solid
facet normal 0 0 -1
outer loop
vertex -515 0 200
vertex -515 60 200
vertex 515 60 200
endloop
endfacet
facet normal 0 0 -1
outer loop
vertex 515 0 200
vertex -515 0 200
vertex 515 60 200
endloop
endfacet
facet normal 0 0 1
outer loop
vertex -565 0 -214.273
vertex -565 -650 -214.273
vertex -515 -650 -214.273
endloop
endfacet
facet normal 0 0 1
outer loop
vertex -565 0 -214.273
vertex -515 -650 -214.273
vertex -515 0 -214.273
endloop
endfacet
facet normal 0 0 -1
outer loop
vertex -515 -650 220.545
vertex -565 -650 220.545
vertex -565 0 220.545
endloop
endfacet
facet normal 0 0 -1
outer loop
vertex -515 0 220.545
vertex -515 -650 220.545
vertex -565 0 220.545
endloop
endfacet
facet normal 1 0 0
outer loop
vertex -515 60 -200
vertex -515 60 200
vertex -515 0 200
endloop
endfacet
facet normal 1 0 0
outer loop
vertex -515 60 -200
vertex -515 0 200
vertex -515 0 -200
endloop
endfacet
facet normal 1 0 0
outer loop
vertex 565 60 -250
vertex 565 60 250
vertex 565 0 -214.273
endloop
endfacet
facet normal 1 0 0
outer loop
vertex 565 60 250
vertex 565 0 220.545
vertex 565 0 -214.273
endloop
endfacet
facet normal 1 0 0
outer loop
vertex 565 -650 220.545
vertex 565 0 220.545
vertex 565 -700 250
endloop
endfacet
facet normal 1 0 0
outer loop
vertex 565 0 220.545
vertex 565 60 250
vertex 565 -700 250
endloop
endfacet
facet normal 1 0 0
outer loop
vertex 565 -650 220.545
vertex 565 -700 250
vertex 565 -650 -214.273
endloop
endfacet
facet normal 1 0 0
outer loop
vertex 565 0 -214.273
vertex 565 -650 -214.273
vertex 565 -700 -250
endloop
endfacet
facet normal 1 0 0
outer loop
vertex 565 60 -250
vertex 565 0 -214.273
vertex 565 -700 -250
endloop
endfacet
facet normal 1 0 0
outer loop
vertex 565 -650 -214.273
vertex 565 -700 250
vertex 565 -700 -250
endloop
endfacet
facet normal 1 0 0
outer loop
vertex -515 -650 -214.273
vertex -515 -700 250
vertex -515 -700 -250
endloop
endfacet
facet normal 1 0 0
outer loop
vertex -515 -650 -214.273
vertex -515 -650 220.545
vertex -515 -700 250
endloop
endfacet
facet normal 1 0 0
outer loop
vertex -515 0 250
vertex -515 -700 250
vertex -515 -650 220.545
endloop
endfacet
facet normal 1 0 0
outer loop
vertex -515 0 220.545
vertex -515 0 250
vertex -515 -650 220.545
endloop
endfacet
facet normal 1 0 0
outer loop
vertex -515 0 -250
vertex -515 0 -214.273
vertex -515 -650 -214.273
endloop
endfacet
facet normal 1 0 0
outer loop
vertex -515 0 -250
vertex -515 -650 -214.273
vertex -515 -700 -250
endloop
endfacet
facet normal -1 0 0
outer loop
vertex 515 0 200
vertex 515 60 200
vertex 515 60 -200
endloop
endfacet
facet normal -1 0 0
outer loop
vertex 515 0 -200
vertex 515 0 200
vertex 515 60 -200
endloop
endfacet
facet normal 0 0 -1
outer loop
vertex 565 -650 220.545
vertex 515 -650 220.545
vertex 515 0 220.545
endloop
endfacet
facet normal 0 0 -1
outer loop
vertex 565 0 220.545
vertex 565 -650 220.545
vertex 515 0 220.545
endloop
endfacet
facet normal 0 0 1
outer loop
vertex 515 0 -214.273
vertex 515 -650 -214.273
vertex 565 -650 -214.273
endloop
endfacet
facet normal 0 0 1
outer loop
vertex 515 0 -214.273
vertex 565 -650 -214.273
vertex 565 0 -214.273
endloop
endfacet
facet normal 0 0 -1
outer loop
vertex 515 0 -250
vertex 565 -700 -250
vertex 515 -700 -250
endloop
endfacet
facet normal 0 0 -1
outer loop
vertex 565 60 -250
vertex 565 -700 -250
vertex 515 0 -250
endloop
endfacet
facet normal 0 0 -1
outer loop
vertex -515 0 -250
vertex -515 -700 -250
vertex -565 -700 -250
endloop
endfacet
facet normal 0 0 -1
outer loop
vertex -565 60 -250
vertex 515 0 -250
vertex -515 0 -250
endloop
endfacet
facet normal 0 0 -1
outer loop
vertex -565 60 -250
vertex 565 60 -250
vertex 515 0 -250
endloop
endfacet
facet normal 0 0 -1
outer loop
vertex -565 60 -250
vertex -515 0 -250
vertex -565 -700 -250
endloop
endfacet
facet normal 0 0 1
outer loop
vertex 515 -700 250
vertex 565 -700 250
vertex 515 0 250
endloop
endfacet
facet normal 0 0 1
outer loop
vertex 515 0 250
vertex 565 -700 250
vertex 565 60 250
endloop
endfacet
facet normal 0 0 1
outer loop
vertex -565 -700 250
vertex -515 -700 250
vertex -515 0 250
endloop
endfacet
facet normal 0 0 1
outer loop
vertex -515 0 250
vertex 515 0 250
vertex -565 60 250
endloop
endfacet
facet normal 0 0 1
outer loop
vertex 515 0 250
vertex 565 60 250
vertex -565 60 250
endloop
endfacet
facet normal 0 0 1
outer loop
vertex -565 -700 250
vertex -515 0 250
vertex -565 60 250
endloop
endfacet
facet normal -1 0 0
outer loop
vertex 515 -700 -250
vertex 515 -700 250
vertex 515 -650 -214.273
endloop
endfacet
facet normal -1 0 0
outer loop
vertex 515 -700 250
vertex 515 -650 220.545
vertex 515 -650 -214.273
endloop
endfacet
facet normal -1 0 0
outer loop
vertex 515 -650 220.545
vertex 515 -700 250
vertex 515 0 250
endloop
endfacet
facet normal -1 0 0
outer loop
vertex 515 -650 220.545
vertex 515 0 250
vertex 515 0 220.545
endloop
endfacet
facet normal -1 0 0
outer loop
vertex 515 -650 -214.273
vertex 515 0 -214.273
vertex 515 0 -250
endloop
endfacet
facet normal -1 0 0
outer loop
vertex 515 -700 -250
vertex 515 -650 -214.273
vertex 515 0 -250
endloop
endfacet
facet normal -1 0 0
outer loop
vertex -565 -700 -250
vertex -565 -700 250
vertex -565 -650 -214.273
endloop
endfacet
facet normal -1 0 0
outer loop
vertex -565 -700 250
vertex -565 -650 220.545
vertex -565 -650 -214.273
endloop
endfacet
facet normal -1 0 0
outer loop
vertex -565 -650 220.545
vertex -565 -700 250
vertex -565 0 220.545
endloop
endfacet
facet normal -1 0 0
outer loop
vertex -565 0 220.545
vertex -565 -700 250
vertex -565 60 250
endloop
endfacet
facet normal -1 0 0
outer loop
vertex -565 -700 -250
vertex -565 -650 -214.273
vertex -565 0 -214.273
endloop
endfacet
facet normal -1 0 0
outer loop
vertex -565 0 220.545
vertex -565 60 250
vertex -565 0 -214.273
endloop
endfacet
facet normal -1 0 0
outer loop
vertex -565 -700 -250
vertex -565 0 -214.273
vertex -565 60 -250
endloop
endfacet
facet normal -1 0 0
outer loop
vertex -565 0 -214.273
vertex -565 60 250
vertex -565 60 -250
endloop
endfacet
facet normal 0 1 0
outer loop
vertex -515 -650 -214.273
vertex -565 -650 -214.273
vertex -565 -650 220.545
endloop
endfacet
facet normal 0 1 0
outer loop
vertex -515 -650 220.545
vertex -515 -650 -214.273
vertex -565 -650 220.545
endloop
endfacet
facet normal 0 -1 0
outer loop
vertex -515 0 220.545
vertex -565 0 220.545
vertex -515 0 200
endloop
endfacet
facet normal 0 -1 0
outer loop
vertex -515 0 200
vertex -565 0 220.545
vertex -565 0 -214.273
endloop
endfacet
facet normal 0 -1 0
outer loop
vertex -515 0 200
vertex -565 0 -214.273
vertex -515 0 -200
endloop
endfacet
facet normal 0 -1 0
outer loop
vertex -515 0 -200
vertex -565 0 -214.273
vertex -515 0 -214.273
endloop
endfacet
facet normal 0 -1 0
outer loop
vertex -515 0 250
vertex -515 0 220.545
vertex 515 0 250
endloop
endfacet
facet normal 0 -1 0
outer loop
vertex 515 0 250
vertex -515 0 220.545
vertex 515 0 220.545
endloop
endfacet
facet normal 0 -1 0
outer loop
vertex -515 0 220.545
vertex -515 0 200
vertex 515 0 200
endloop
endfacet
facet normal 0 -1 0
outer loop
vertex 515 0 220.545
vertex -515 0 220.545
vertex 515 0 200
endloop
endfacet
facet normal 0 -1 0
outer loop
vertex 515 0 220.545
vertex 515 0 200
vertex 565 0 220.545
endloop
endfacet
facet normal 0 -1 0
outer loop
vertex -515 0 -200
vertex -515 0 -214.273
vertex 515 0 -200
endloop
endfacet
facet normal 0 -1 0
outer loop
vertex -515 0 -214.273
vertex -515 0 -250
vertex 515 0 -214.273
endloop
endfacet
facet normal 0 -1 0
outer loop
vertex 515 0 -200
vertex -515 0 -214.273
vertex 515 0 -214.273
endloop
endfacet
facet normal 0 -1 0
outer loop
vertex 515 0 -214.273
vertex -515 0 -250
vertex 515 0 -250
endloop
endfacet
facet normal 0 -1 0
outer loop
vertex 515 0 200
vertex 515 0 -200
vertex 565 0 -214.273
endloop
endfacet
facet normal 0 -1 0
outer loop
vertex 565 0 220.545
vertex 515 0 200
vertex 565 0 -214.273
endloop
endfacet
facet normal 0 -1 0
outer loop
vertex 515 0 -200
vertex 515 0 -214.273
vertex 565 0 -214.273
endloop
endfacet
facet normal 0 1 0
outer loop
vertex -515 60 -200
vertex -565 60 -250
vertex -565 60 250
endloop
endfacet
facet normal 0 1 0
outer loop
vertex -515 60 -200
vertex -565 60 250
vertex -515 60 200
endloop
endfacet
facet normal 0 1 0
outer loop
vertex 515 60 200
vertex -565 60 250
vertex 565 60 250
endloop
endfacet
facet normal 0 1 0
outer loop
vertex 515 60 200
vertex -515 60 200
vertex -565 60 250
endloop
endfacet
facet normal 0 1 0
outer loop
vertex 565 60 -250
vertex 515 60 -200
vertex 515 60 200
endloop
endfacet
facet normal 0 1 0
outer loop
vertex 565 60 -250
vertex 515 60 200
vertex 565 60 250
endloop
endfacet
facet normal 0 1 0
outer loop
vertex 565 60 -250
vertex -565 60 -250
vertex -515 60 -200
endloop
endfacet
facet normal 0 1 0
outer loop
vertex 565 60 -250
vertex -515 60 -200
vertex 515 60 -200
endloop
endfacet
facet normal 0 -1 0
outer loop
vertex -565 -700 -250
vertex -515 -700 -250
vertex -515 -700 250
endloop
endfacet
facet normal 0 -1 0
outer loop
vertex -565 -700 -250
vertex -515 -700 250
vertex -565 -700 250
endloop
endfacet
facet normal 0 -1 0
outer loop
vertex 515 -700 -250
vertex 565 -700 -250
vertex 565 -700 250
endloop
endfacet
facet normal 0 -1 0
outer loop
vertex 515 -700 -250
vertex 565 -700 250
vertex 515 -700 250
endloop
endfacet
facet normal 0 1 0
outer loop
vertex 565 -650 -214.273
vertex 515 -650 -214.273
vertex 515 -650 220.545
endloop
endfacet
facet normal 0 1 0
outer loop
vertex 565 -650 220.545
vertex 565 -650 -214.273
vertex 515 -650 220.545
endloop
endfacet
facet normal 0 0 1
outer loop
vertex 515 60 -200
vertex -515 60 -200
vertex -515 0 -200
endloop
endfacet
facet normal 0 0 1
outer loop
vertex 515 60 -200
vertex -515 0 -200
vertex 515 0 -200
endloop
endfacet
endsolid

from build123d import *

# Parameters (mm, degrees)
SKETCH1_W           = 1130
SKETCH1_H           = 500
BOSS_EXTRUDE1_DEPTH = 60
SKETCH2_W           = 1030
SKETCH2_H           = 400
CUT_EXTRUDE1_DEPTH  = 60
SKETCH3_W           = 50
SKETCH3_H           = 500
BOSS_EXTRUDE3_DEPTH = 700
SKETCH5_W           = 434.818131318
SKETCH5_H           = 650
CUT_EXTRUDE2_DEPTH  = 1902


with BuildPart() as part:
    # Sketch1 → Boss-Extrude1 (new body)
    with BuildSketch(Plane(origin=(0, 0, 0), x_dir=(1, 0, 0), z_dir=(0, 1, 0))):
        Rectangle(SKETCH1_W, SKETCH1_H)
    extrude(amount=BOSS_EXTRUDE1_DEPTH)

    # Sketch2 → Cut-Extrude1 (cut)
    with BuildSketch(Plane(origin=(0, 60, 0), x_dir=(1, 0, 0), z_dir=(0, 1, 0))):
        Rectangle(SKETCH2_W, SKETCH2_H)
    extrude(amount=-CUT_EXTRUDE1_DEPTH, mode=Mode.SUBTRACT)

    # Sketch3 → Boss-Extrude3 (add)
    with BuildSketch(Plane(origin=(0, 0, 0), x_dir=(-1, 0, 0), z_dir=(0, -1, 0))):
        with Locations((540, 0)):
            Rectangle(SKETCH3_W, SKETCH3_H)
        with Locations((-540, 0)):
            Rectangle(SKETCH3_W, SKETCH3_H)
    extrude(amount=BOSS_EXTRUDE3_DEPTH)

    # Sketch5 → Cut-Extrude2 (cut)
    with BuildSketch(Plane.ZY.offset(565)):
        with Locations((3.135707678, -325)):
            Rectangle(SKETCH5_W, SKETCH5_H)
    extrude(amount=-CUT_EXTRUDE2_DEPTH, mode=Mode.SUBTRACT)


solid = part.part
